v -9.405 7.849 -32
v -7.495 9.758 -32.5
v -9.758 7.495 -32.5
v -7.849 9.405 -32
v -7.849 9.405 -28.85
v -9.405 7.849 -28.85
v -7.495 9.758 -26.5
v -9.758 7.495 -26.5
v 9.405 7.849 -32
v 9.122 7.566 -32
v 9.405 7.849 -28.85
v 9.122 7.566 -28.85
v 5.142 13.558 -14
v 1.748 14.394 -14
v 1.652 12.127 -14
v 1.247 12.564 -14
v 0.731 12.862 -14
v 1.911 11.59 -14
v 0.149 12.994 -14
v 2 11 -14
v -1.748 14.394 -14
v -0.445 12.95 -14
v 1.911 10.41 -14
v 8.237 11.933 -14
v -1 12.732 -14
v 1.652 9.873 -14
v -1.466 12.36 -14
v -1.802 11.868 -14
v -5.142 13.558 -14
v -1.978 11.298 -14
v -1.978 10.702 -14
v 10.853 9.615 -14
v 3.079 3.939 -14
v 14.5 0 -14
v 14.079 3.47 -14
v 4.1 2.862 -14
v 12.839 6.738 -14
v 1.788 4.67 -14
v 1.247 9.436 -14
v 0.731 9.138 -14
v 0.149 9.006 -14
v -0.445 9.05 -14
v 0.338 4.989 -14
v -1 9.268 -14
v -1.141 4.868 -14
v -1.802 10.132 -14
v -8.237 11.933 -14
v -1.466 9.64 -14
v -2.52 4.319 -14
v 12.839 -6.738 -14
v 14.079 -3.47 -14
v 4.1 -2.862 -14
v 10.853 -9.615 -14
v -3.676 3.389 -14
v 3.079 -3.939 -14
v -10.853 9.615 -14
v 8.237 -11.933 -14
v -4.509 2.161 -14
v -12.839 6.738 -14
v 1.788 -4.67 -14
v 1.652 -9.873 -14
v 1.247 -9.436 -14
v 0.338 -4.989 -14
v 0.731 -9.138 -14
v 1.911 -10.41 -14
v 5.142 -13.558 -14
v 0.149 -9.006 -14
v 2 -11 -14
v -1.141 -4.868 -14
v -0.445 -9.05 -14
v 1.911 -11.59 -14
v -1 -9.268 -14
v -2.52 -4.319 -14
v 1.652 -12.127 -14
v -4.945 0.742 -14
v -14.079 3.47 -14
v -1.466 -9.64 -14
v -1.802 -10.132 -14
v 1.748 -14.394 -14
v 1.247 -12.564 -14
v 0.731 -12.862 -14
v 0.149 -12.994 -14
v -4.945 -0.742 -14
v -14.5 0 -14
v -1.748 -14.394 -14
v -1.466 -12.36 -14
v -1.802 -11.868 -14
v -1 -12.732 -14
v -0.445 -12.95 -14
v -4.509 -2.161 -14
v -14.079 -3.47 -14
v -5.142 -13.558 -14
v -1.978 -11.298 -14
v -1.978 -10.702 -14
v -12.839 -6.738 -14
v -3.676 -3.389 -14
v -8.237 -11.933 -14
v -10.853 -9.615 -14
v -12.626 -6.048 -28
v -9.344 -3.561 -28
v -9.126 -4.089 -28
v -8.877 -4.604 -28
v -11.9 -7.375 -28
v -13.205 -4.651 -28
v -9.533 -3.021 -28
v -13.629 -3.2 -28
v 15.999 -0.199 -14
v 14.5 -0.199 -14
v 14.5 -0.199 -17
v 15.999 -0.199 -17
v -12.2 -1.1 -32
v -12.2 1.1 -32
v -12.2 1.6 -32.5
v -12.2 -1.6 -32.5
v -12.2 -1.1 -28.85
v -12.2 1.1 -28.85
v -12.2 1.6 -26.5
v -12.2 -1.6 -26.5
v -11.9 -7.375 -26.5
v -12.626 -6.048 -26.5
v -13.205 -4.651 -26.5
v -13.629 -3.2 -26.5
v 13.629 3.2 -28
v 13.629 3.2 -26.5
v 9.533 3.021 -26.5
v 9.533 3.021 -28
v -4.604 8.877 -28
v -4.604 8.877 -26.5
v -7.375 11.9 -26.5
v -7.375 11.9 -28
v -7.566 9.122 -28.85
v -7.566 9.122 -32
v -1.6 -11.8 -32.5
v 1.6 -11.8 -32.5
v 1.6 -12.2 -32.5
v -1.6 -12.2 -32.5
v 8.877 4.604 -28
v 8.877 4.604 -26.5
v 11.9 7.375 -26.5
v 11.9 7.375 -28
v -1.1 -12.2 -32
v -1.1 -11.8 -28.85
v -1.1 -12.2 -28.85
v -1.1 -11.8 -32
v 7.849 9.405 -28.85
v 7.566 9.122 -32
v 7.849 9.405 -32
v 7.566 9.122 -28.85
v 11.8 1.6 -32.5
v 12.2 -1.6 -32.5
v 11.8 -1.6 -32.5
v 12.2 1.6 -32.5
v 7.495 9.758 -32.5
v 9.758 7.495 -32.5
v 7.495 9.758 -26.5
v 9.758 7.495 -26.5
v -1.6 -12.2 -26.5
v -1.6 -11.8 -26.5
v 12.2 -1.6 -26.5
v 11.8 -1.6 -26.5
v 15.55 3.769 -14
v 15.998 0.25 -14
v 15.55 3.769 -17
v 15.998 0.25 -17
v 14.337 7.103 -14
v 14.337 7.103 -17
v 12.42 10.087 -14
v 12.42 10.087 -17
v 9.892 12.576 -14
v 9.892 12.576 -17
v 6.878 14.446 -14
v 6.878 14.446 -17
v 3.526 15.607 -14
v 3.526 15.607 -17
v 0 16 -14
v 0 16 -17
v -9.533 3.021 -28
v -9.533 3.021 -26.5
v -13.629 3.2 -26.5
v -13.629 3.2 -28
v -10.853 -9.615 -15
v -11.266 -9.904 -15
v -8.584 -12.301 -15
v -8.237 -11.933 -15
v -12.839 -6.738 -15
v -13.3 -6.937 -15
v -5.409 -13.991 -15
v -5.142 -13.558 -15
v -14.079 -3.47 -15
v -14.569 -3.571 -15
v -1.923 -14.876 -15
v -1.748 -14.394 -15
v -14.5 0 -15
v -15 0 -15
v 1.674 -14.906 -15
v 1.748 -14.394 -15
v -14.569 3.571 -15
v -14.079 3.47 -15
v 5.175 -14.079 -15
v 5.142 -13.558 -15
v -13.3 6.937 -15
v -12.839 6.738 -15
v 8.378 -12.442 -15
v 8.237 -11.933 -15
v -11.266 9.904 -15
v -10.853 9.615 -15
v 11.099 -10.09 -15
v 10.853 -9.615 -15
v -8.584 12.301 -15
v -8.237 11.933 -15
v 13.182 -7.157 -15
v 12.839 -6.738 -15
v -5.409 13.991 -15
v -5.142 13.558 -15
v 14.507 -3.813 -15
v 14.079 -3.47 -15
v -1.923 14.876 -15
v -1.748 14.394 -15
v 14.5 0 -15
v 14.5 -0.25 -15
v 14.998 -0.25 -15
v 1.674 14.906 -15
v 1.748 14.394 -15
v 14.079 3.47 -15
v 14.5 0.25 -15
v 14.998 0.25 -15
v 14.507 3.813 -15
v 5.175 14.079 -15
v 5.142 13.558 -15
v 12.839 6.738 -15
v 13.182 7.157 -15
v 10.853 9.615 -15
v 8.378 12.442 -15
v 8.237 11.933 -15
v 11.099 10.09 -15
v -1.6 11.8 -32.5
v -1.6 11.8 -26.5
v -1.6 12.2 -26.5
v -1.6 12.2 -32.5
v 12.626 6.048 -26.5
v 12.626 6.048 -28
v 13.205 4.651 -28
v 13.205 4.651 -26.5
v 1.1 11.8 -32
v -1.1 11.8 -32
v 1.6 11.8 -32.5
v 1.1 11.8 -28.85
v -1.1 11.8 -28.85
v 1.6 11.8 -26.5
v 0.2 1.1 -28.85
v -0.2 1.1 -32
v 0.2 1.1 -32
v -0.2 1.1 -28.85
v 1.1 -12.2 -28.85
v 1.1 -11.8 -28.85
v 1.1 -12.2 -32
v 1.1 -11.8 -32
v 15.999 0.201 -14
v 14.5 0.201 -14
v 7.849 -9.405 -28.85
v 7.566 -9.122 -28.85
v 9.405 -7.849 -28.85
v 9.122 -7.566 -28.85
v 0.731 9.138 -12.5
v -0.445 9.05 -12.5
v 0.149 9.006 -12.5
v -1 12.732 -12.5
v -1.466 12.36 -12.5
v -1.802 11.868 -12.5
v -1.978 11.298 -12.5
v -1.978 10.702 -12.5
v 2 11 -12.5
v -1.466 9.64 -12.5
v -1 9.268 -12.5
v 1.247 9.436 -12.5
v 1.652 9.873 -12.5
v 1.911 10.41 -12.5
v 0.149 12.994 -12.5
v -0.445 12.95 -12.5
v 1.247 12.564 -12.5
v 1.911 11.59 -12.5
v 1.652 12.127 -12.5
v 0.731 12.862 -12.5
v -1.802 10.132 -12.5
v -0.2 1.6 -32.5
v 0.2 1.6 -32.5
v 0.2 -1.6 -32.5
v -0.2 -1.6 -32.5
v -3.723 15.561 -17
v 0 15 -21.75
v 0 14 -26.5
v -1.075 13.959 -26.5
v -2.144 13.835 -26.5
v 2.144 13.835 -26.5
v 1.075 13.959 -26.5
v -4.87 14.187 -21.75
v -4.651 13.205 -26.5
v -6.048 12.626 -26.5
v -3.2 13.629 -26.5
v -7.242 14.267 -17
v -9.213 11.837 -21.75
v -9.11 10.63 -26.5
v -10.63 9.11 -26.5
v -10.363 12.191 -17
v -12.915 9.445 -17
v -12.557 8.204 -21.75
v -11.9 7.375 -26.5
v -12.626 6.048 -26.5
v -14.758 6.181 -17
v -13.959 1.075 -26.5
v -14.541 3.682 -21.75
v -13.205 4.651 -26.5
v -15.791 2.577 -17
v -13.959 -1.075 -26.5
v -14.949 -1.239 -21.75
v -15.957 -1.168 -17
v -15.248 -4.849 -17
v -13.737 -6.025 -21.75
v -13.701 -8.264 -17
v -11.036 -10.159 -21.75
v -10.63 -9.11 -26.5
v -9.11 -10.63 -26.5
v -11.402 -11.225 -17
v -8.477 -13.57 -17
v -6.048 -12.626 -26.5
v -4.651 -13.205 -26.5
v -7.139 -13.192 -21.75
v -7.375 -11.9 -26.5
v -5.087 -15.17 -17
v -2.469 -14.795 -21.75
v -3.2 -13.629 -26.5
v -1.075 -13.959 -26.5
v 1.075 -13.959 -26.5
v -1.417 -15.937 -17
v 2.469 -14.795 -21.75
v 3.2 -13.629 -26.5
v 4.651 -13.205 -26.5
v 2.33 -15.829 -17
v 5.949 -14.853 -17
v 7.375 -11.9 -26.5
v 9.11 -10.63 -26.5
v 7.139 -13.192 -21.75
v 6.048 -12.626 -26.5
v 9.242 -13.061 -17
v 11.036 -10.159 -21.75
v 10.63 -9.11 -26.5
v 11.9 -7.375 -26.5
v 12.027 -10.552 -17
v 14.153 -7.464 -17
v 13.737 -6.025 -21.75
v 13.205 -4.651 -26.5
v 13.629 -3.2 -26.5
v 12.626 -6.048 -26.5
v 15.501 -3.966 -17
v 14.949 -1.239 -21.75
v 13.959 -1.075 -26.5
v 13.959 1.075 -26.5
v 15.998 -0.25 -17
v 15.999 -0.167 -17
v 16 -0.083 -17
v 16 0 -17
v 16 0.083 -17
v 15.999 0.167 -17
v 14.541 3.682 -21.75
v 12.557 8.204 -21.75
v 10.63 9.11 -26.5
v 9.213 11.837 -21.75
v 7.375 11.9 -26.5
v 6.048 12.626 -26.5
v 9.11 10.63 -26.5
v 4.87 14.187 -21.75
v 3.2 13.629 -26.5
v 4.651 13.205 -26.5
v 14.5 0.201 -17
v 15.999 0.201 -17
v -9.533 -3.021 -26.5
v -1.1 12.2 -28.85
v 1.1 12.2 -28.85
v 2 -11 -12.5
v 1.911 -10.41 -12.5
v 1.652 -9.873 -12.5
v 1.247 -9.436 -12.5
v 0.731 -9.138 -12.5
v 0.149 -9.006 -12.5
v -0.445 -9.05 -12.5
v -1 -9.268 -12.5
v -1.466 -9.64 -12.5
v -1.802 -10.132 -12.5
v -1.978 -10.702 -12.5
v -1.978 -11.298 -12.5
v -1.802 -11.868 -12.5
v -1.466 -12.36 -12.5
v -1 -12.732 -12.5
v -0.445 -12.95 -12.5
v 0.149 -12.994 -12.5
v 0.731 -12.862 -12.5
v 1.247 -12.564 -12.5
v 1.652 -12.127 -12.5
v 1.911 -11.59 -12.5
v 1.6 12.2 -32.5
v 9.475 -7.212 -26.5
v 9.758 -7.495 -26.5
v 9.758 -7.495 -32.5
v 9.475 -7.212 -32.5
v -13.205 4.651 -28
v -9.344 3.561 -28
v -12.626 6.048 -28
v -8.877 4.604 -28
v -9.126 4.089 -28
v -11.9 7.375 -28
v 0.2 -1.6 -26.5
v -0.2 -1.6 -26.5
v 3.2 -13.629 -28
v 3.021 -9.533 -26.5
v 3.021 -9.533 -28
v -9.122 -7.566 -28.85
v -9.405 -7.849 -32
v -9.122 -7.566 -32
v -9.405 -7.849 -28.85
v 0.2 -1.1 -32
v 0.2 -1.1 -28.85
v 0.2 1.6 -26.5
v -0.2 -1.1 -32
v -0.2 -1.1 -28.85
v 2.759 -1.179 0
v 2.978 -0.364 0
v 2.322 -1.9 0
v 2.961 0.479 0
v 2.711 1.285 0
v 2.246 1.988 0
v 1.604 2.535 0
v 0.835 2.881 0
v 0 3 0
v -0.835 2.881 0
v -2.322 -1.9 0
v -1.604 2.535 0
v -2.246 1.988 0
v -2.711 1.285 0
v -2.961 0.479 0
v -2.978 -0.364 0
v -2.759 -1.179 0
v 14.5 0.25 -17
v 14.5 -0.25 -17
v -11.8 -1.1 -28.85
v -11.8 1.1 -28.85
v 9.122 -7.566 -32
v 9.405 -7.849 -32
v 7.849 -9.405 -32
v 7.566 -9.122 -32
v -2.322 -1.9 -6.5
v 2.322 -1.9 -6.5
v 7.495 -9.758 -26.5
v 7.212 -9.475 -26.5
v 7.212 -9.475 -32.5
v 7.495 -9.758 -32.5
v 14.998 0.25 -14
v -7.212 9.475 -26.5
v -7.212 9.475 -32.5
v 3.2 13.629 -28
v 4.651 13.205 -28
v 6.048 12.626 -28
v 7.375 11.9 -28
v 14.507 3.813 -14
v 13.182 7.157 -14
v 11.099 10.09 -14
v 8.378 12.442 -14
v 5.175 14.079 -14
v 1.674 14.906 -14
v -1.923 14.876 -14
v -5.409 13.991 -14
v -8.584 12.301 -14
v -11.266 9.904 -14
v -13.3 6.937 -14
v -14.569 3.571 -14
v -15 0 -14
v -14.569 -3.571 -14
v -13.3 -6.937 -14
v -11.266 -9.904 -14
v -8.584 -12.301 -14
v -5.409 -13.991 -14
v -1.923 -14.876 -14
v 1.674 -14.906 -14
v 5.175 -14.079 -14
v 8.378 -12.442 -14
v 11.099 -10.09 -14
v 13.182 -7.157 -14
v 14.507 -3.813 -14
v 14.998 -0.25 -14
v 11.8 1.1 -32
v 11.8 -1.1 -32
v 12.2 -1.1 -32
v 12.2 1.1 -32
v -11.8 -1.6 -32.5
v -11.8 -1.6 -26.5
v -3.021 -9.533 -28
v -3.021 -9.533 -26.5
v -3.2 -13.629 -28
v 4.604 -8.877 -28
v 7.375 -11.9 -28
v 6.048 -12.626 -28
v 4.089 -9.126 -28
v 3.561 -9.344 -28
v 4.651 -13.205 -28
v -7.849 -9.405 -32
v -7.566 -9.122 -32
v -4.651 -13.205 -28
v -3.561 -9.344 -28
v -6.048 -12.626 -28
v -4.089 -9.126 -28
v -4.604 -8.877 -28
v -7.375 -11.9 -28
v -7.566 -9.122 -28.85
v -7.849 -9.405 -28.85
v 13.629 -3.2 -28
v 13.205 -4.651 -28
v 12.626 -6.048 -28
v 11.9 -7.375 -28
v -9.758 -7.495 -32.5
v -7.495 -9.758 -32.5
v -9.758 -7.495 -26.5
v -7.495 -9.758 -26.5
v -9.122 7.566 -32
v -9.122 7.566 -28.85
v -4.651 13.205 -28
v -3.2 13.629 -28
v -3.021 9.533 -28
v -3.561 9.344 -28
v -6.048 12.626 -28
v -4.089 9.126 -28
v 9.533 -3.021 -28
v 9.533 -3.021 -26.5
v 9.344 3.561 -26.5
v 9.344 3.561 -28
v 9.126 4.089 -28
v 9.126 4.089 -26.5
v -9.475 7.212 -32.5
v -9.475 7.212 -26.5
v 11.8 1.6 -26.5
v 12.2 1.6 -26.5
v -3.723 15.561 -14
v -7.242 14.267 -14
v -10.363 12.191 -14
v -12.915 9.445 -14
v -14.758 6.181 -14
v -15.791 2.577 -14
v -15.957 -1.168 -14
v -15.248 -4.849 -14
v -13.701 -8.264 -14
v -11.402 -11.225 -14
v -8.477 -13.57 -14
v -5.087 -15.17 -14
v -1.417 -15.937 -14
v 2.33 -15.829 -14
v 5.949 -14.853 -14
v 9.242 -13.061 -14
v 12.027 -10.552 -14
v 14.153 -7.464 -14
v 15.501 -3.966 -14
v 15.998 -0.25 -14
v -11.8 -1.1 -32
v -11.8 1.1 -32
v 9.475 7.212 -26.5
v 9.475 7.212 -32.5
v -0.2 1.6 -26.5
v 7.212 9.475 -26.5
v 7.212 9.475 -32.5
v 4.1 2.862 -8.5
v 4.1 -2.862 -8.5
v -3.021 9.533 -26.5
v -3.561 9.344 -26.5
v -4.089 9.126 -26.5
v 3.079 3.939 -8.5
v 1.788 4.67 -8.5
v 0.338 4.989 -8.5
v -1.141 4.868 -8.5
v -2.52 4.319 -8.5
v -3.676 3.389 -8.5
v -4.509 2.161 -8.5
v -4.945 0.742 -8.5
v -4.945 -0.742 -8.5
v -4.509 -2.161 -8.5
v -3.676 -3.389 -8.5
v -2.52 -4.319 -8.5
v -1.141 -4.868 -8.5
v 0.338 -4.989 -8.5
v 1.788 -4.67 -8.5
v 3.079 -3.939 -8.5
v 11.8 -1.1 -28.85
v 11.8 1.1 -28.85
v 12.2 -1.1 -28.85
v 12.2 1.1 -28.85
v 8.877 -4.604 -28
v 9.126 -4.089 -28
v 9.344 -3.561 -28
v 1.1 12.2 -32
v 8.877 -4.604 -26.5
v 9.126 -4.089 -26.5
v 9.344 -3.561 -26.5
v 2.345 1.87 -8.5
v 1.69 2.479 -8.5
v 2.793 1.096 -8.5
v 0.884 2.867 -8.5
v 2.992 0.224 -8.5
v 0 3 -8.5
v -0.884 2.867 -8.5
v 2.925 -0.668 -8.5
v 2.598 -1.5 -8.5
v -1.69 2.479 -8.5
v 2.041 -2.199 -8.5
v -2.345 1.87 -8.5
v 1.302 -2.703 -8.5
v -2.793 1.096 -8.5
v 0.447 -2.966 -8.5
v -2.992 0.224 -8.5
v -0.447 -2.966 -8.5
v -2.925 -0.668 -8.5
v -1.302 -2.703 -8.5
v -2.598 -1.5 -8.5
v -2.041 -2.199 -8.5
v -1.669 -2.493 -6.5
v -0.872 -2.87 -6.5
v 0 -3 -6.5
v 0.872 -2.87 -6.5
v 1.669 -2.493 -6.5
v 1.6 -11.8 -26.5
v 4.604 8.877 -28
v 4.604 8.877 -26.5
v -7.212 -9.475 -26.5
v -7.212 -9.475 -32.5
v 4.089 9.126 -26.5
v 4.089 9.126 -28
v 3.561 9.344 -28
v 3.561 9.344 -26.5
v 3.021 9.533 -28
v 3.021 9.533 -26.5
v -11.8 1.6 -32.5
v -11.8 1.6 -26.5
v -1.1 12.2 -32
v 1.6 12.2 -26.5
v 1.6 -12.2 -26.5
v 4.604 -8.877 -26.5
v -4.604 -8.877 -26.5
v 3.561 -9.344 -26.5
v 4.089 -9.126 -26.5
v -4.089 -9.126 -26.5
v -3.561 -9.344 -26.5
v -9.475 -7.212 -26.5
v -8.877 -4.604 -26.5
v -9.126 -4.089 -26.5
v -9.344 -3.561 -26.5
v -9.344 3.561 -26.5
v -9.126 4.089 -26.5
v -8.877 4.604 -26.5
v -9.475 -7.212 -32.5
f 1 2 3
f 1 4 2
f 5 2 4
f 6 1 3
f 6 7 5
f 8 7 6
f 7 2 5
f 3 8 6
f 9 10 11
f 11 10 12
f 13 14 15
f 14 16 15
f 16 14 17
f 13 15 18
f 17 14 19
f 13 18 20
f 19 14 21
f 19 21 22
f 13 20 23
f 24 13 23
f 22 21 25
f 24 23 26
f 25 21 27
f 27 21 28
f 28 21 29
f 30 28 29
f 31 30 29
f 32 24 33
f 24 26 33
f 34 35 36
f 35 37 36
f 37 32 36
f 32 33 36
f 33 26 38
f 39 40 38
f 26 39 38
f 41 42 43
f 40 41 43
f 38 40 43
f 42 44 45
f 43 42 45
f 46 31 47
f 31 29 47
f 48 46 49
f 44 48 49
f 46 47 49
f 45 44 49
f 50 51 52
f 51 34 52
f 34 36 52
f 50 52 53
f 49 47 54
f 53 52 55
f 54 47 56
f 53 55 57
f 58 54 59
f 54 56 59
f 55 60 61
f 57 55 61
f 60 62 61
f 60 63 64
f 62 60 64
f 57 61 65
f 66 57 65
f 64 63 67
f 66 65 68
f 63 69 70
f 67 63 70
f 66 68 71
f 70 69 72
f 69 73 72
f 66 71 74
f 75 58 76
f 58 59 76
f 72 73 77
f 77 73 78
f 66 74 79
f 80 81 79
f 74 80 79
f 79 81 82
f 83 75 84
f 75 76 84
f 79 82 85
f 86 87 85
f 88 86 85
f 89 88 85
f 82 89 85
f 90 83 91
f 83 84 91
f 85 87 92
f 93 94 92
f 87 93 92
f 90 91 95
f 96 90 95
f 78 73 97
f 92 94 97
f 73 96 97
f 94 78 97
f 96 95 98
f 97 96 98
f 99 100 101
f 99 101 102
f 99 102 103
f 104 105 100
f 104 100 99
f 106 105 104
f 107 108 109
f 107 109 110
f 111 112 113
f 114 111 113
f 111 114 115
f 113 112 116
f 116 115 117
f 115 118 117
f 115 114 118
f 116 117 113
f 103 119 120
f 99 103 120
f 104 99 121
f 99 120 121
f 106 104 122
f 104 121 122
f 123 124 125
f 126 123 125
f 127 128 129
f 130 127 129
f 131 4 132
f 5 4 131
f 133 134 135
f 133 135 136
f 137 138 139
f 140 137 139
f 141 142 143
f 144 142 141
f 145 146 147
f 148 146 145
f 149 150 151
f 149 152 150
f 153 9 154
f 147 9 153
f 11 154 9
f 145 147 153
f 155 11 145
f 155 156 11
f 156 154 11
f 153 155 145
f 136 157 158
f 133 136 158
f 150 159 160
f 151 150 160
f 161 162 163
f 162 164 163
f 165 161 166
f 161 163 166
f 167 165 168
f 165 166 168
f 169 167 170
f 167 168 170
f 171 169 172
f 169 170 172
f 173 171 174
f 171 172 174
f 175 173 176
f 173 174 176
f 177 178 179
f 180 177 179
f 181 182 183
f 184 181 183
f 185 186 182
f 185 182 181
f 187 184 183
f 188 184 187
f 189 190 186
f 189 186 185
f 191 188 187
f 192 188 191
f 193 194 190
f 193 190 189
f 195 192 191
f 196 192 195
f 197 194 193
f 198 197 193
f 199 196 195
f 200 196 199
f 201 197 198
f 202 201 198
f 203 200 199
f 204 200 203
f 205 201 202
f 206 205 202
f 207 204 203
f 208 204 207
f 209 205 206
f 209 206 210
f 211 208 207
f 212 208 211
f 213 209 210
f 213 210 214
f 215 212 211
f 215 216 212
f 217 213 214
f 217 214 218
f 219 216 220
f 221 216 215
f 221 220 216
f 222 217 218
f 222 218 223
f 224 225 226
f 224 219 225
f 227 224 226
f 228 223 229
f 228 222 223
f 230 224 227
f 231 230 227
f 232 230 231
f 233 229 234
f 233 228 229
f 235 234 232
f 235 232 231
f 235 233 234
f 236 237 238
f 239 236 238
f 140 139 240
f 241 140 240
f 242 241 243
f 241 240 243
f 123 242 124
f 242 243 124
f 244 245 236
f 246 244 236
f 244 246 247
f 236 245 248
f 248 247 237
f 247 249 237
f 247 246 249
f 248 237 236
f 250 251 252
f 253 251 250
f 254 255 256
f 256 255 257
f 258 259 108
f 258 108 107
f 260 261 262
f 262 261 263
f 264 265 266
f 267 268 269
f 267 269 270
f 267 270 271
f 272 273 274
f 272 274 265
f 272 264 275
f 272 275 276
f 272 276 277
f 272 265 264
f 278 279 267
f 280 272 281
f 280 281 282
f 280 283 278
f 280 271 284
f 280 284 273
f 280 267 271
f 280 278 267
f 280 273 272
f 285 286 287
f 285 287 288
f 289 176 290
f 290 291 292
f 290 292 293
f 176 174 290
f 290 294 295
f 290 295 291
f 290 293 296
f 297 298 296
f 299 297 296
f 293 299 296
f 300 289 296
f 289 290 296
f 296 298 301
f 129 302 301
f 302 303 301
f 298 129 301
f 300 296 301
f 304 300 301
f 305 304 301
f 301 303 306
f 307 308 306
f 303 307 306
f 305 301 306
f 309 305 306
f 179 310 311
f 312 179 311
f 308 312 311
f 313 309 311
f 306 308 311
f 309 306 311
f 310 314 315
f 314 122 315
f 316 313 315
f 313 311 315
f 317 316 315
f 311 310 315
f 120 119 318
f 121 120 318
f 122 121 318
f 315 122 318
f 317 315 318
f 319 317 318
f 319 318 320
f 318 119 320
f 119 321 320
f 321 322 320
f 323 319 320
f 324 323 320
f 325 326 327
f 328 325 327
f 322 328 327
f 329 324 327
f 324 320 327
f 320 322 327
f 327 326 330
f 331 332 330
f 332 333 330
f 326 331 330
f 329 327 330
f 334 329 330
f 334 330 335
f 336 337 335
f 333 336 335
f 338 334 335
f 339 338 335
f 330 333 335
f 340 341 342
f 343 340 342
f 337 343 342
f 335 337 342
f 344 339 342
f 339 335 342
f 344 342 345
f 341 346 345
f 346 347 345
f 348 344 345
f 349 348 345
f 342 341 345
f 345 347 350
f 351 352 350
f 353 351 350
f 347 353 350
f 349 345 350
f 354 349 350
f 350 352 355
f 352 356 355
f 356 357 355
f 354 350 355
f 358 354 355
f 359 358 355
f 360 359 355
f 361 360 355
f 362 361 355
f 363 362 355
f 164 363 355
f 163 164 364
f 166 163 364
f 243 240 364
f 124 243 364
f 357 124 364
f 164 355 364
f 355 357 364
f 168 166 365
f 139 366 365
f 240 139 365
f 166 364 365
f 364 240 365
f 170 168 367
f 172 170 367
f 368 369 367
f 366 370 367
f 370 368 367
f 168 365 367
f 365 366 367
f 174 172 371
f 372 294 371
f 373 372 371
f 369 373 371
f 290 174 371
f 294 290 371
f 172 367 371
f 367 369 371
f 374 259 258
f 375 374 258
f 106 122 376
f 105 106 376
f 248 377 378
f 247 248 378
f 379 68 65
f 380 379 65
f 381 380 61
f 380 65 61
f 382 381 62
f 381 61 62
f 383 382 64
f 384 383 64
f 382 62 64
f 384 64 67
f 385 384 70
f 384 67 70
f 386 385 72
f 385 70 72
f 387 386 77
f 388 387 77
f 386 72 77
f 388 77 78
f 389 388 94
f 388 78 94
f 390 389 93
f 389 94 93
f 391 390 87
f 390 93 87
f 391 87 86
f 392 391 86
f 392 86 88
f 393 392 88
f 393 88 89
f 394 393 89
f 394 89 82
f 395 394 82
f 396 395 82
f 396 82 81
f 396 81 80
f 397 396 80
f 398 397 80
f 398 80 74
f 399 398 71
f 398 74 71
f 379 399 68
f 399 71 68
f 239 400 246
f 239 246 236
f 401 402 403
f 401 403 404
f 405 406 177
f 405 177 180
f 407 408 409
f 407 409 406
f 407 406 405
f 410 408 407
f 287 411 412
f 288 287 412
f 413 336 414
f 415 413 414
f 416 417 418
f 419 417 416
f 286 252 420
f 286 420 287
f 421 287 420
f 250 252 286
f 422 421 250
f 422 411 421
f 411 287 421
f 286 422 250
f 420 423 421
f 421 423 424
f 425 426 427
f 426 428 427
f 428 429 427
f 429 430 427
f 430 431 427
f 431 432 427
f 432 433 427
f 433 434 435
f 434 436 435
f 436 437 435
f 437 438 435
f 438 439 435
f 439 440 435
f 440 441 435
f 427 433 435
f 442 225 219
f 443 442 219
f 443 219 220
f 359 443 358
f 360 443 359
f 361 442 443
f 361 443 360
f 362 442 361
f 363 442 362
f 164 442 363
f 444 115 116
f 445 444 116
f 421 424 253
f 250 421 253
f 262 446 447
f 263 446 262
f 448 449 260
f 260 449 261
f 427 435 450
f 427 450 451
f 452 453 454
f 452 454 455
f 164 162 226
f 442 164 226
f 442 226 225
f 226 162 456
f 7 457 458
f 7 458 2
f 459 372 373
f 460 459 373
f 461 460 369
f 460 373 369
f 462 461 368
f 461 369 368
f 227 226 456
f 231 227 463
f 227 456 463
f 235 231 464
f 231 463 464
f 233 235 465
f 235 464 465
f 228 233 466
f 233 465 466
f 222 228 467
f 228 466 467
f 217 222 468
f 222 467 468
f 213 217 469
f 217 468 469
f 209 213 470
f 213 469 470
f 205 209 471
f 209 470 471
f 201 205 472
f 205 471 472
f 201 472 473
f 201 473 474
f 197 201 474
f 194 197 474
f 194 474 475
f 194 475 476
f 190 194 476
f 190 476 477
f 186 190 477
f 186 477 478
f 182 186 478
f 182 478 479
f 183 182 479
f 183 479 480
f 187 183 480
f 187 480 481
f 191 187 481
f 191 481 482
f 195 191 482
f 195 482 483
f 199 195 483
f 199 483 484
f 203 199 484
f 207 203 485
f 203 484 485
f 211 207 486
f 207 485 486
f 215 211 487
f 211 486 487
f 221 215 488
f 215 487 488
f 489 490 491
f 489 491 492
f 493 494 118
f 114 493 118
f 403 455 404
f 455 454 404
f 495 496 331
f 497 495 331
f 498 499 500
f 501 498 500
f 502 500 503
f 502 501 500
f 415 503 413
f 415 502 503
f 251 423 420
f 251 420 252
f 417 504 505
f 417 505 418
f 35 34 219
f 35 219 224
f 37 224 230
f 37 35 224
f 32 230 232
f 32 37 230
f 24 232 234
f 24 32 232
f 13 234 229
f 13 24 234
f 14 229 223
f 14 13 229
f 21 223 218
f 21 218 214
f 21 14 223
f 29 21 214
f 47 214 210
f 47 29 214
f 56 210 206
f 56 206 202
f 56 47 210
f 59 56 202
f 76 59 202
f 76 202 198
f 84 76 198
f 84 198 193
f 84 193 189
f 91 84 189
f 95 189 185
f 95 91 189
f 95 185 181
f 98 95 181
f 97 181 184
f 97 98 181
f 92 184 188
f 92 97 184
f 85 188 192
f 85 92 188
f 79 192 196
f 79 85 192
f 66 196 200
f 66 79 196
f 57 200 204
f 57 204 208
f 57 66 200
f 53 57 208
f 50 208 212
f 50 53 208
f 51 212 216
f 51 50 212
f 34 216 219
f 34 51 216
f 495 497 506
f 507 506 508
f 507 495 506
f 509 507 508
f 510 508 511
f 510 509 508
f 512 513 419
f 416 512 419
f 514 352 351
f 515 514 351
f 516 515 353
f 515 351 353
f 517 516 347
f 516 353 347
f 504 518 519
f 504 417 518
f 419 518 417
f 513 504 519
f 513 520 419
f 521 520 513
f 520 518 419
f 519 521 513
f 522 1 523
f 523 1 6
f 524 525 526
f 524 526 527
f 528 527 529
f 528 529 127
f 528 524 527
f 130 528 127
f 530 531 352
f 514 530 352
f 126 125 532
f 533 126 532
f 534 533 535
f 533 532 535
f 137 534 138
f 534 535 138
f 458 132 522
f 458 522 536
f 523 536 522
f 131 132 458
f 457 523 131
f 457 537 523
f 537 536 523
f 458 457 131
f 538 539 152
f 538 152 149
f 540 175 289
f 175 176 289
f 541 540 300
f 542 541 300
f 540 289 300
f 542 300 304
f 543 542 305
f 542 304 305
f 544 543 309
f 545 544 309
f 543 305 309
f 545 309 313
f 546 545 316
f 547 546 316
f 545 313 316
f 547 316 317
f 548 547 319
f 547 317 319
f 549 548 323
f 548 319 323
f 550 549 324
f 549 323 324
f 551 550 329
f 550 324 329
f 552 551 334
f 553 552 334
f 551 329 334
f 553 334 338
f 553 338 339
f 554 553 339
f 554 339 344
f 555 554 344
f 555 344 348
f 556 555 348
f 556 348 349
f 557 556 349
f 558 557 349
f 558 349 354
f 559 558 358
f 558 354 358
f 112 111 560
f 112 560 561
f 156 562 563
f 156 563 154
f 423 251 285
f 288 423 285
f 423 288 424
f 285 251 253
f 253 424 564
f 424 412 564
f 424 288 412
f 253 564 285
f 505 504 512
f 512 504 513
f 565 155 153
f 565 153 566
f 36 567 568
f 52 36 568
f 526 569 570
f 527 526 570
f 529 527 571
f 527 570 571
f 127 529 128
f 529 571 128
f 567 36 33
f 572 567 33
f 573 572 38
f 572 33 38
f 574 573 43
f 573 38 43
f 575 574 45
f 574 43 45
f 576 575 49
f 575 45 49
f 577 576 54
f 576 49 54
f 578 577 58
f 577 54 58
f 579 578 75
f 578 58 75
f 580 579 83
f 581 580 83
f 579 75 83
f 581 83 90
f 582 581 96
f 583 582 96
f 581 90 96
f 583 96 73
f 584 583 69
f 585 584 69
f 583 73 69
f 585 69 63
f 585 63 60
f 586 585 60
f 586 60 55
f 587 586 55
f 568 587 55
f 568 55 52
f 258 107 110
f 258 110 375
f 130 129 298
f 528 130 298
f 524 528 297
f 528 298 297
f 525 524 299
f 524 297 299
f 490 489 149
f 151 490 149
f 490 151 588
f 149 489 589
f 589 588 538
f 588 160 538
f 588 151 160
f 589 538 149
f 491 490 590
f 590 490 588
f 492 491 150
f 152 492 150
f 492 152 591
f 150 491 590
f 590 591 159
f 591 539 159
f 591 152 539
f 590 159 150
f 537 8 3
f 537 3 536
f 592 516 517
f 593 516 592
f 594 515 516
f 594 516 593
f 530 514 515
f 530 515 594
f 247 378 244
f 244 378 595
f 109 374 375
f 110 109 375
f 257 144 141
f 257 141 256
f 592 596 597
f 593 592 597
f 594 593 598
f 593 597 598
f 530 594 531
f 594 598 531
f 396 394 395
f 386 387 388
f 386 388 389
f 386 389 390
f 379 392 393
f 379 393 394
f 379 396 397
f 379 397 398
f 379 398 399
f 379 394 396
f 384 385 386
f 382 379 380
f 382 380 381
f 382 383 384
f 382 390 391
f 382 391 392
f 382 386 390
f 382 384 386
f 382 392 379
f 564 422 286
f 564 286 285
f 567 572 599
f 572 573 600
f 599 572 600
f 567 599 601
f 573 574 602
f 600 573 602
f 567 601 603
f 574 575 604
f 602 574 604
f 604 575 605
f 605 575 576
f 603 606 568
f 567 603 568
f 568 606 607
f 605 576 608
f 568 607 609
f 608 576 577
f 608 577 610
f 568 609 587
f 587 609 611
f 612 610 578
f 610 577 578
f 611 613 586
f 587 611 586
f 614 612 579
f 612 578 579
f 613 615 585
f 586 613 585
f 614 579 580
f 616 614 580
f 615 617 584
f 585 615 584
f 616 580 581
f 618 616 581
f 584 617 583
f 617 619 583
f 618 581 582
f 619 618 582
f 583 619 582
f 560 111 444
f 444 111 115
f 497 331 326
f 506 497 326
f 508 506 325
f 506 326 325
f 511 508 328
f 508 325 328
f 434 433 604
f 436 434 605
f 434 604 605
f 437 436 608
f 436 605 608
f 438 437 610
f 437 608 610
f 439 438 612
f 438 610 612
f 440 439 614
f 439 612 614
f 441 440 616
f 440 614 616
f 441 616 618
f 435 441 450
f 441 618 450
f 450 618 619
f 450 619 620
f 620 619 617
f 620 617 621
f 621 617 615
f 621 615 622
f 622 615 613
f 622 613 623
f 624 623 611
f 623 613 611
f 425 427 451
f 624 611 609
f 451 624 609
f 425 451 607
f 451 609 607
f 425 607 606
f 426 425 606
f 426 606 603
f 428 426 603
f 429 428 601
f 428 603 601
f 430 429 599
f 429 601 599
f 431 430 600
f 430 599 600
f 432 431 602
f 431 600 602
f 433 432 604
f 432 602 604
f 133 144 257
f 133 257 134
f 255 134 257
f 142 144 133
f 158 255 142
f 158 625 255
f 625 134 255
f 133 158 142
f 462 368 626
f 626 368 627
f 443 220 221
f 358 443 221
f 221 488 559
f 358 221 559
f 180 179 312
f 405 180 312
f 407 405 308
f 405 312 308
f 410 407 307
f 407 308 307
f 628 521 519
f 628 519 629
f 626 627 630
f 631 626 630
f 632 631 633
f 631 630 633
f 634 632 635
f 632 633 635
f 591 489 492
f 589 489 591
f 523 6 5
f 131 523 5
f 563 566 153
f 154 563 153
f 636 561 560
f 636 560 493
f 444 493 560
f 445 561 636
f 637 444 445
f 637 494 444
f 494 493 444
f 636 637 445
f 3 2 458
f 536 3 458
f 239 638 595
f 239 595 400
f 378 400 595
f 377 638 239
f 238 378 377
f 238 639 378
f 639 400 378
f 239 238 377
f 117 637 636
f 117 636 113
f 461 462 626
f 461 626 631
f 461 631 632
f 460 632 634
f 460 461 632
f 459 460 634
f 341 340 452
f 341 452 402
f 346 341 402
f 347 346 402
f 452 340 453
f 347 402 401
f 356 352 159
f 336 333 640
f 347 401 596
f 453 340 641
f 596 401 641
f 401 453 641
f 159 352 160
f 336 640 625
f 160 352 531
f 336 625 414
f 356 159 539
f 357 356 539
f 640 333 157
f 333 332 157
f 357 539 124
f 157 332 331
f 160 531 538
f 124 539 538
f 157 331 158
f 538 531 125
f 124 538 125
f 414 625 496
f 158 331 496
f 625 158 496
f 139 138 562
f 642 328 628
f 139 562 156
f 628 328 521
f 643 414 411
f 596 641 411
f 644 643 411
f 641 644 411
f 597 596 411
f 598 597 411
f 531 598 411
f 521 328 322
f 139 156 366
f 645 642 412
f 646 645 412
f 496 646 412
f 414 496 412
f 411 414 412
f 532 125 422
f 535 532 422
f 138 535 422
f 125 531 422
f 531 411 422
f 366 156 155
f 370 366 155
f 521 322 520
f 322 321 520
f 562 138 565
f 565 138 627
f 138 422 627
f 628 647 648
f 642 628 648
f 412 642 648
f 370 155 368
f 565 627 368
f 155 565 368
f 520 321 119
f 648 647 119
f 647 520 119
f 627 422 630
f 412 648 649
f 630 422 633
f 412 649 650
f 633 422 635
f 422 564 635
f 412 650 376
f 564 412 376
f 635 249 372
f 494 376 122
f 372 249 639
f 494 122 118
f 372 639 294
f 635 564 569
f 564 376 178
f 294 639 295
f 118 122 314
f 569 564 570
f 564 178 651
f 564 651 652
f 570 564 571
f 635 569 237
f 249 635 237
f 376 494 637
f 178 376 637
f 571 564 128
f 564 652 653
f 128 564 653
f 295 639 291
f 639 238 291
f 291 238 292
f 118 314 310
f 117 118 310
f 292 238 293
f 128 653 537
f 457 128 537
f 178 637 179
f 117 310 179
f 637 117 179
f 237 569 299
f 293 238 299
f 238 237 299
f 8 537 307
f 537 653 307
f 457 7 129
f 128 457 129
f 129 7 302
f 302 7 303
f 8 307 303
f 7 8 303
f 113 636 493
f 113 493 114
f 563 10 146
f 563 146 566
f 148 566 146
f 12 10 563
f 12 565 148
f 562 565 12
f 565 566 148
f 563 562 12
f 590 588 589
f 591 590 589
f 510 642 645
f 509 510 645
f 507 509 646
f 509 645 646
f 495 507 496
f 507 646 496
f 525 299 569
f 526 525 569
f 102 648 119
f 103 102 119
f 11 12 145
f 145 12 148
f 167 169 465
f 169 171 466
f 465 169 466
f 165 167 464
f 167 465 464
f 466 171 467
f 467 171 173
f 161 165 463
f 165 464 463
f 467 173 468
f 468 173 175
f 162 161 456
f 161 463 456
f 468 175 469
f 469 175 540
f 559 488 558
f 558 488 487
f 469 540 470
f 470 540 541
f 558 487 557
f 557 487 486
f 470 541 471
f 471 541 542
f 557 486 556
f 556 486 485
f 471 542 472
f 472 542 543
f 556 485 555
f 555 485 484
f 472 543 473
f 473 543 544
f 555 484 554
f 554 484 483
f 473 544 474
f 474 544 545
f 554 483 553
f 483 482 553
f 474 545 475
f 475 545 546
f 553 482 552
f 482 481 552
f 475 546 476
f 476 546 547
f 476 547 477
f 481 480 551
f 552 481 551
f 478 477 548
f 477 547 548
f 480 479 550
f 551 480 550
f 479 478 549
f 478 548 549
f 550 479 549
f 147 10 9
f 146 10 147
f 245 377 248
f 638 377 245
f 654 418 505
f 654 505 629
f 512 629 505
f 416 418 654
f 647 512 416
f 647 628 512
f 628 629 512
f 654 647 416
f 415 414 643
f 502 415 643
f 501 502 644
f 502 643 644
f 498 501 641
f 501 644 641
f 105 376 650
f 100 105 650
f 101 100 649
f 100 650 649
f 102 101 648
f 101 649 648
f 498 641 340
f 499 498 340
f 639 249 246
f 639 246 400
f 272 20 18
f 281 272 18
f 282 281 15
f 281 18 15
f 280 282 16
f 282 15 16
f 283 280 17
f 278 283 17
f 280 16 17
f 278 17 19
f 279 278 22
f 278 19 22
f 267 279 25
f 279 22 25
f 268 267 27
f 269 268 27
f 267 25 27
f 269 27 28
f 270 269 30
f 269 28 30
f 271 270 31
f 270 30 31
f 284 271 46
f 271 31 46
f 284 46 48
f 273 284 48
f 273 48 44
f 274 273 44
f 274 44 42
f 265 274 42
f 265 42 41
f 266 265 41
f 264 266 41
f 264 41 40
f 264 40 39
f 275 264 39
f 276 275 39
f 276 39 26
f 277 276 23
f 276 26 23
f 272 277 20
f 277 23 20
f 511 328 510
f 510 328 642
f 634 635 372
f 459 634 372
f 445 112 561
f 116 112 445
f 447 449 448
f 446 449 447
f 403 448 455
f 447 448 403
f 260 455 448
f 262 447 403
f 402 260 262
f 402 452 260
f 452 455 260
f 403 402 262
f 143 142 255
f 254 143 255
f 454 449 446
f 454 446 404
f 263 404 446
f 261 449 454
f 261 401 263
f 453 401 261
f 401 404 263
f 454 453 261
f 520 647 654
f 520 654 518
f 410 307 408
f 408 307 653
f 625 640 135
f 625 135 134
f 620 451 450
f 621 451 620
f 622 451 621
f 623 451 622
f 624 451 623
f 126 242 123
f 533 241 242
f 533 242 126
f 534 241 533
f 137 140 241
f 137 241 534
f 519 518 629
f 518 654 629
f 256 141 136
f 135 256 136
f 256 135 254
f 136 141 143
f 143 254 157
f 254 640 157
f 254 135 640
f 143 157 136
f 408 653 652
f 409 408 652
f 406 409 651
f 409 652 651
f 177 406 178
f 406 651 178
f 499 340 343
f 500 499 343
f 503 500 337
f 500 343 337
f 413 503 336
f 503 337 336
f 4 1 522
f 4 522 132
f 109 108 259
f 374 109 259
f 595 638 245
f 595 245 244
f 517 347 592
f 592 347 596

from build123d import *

# Parameters (mm, degrees)
CORTAR_EXTRUIR1_DEPTH   = 6.5
CORTAR_EXTRUIR2_DEPTH   = 5.5
CROQUIS6_R              = 2
SALIENTE_EXTRUIR1_DEPTH = 1.5
CROQUIS10_R             = 15
CROQUIS10_R_2           = 14.5
CORTAR_EXTRUIR5_DEPTH   = 1
CORTAR_EXTRUIR6_DEPTH   = 3
CROQUIS12_W             = 1.498741956
CROQUIS12_H             = 0.4
SALIENTE_EXTRUIR5_DEPTH = 3
SALIENTE_EXTRUIR6_DEPTH = 1.5
CROQUIS13_3_W           = 3.2
CROQUIS13_3_H           = 0.4
CROQUIS13_3_W_2         = 0.4
CROQUIS13_3_H_2         = 1.6
CROQUIS13_3_H_3         = 3.2
SALIENTE_EXTRUIR7_DEPTH = 6
CROQUIS14_W             = 2.2
CROQUIS14_H             = 3.15
CORTAR_EXTRUIR8_DEPTH   = 29.2
CROQUIS16_W             = 3.15
CROQUIS16_H             = 2.2
CORTAR_EXTRUIR10_DEPTH  = 35.827416998
CROQUIS17_W             = 3.15
CROQUIS17_H             = 2.2
CORTAR_EXTRUIR11_DEPTH  = 35.827416998
CROQUIS18_W             = 0.4
CROQUIS18_H             = 3.2
SALIENTE_EXTRUIR8_DEPTH = 6
CROQUIS15_W             = 3.15
CROQUIS15_H             = 2.2
CORTAR_EXTRUIR12_DEPTH  = 29.2


with BuildPart() as part:
    # Croquis3 → Revolución1 (revolve)
    with BuildSketch(Plane(origin=(0, 0, 0), x_dir=(0, 0, -1), z_dir=(1, 0, 0))):
        Polygon((0, 0), (0, 3), (8.5, 3), (8.5, 5), (14, 5), (14, 16), (17, 16), (26.5, 14), (26.5, 0), align=None)
    revolve(axis=Axis((0, 0, -26.5), (0, 0, 1)))

    # Croquis4 → Cortar-Extruir1 (cut)
    with BuildSketch(Plane.XY):
        with BuildLine():
            Line((-2.321637353, -1.9), (2.321637353, -1.9))
            ThreePointArc((2.321637353, -1.9), (0, -3), (-2.321637353, -1.9))
        make_face()
    extrude(amount=-CORTAR_EXTRUIR1_DEPTH, mode=Mode.SUBTRACT)

    # Croquis5 → Cortar-Extruir2 (cut)
    with BuildSketch(Plane.XY.offset(-8.5)):
        with BuildLine():
            Line((4.1, 2.861817604), (4.1, -2.861817604))
            ThreePointArc((4.1, -2.861817604), (5, 0), (4.1, 2.861817604))
        make_face()
    extrude(amount=-CORTAR_EXTRUIR2_DEPTH, mode=Mode.SUBTRACT)

    # Croquis6 → Saliente-Extruir1 (add)
    with BuildSketch(Plane.XY.offset(-14)):
        with Locations((0, 11)):
            Circle(CROQUIS6_R)
        with Locations((0, -11)):
            Circle(CROQUIS6_R)
    extrude(amount=SALIENTE_EXTRUIR1_DEPTH)

    # Croquis10 → Cortar-Extruir5 (cut)
    with BuildSketch(Plane.XY.offset(-14)):
        Circle(CROQUIS10_R)
        Circle(CROQUIS10_R_2, mode=Mode.SUBTRACT)
    extrude(amount=-CORTAR_EXTRUIR5_DEPTH, mode=Mode.SUBTRACT)

    # Croquis11 → Cortar-Extruir6 (cut)
    with BuildSketch(Plane.XY.offset(-14)):
        with BuildLine():
            Line((14.5, 0), (14.5, -0.25))
            Line((14.5, -0.25), (15.998046756, -0.25))
            ThreePointArc((15.998046756, -0.25), (15.999511681, -0.125003815), (16, 0))
            ThreePointArc((16, 0), (15.999511681, 0.125003815), (15.998046756, 0.25))
            Line((15.998046756, 0.25), (14.5, 0.25))
            Line((14.5, 0.25), (14.5, 0))
        make_face()
    extrude(amount=-CORTAR_EXTRUIR6_DEPTH, mode=Mode.SUBTRACT)

    # Croquis13 → Saliente-Extruir6 (add)
    with BuildSketch(Plane(origin=(0, 0, -26.5), x_dir=(-1, 0, 0), z_dir=(0, 0, -1))):
        with BuildLine():
            ThreePointArc((7.374685343, 11.900168742), (5.357568053, 12.934313455), (3.2, 13.62938003))
            Line((3.2, 13.62938003), (3.021135931, 9.532719323))
            ThreePointArc((3.021135931, 9.532719323), (3.826834324, 9.238795325), (4.604384773, 8.87691618))
            Line((4.604384773, 8.87691618), (7.374685343, 11.900168742))
        make_face()
        with BuildLine():
            ThreePointArc((13.62938003, 3.2), (12.934313455, 5.357568053), (11.900168742, 7.374685343))
            Line((11.900168742, 7.374685343), (8.87691618, 4.604384773))
            ThreePointArc((8.87691618, 4.604384773), (9.238795325, 3.826834324), (9.532719323, 3.021135931))
            Line((9.532719323, 3.021135931), (13.62938003, 3.2))
        make_face()
        with BuildLine():
            ThreePointArc((11.900168742, -7.374685343), (12.934313455, -5.357568053), (13.62938003, -3.2))
            Line((13.62938003, -3.2), (9.532719323, -3.021135931))
            ThreePointArc((9.532719323, -3.021135931), (9.238795325, -3.826834324), (8.87691618, -4.604384773))
            Line((8.87691618, -4.604384773), (11.900168742, -7.374685343))
        make_face()
        with BuildLine():
            ThreePointArc((3.2, -13.62938003), (5.357568053, -12.934313455), (7.374685343, -11.900168742))
            Line((7.374685343, -11.900168742), (4.604384773, -8.87691618))
            ThreePointArc((4.604384773, -8.87691618), (3.826834324, -9.238795325), (3.021135931, -9.532719323))
            Line((3.021135931, -9.532719323), (3.2, -13.62938003))
        make_face()
        with BuildLine():
            Line((-4.604384773, -8.87691618), (-7.374685343, -11.900168742))
            ThreePointArc((-7.374685343, -11.900168742), (-5.357568053, -12.934313455), (-3.2, -13.62938003))
            Line((-3.2, -13.62938003), (-3.021135931, -9.532719323))
            ThreePointArc((-3.021135931, -9.532719323), (-3.826834324, -9.238795325), (-4.604384773, -8.87691618))
        make_face()
        with BuildLine():
            Line((-9.532719323, -3.021135931), (-13.62938003, -3.2))
            ThreePointArc((-13.62938003, -3.2), (-12.934313455, -5.357568053), (-11.900168742, -7.374685343))
            Line((-11.900168742, -7.374685343), (-8.87691618, -4.604384773))
            ThreePointArc((-8.87691618, -4.604384773), (-9.238795325, -3.826834324), (-9.532719323, -3.021135931))
        make_face()
        with BuildLine():
            Line((-8.87691618, 4.604384773), (-11.900168742, 7.374685343))
            ThreePointArc((-11.900168742, 7.374685343), (-12.934313455, 5.357568053), (-13.62938003, 3.2))
            Line((-13.62938003, 3.2), (-9.532719323, 3.021135931))
            ThreePointArc((-9.532719323, 3.021135931), (-9.238795325, 3.826834324), (-8.87691618, 4.604384773))
        make_face()
        with BuildLine():
            Line((-3.021135931, 9.532719323), (-3.2, 13.62938003))
            ThreePointArc((-3.2, 13.62938003), (-5.357568053, 12.934313455), (-7.374685343, 11.900168742))
            Line((-7.374685343, 11.900168742), (-4.604384773, 8.87691618))
            ThreePointArc((-4.604384773, 8.87691618), (-3.826834324, 9.238795325), (-3.021135931, 9.532719323))
        make_face()
    extrude(amount=SALIENTE_EXTRUIR6_DEPTH)

    # Croquis13<3> → Saliente-Extruir7 (add)
    with BuildSketch(Plane(origin=(0, 0, -26.5), x_dir=(-1, 0, 0), z_dir=(0, 0, -1))):
        with Locations((0, 12)):
            Rectangle(CROQUIS13_3_W, CROQUIS13_3_H)
        Polygon((7.495331881, 9.75807358), (9.75807358, 7.495331881), (9.475230868, 7.212489168), (7.212489168, 9.475230868), align=None)
        Polygon((-9.75807358, 7.495331881), (-7.495331881, 9.75807358), (-7.212489168, 9.475230868), (-9.475230868, 7.212489168), align=None)
        with Locations((-12, -0.8)):
            Rectangle(CROQUIS13_3_W_2, CROQUIS13_3_H_2)
        with Locations((-12, 0.8)):
            Rectangle(CROQUIS13_3_W_2, CROQUIS13_3_H_2)
        Polygon((-7.495331881, -9.75807358), (-9.75807358, -7.495331881), (-9.475230868, -7.212489168), (-7.212489168, -9.475230868), align=None)
        with Locations((0, -12)):
            Rectangle(CROQUIS13_3_W, CROQUIS13_3_H)
        Polygon((9.75807358, -7.495331881), (7.495331881, -9.75807358), (7.212489168, -9.475230868), (9.475230868, -7.212489168), align=None)
        with Locations((12, 0)):
            Rectangle(CROQUIS13_3_W_2, CROQUIS13_3_H_3)
    extrude(amount=SALIENTE_EXTRUIR7_DEPTH)

    # Croquis14 → Cortar-Extruir8 (cut, through all)
    with BuildSketch(Plane(origin=(0, 12.2, 0), x_dir=(1, 0, 0), z_dir=(0, 1, 0))):
        with Locations((0, 30.425)):
            Rectangle(CROQUIS14_W, CROQUIS14_H)
    extrude(amount=-CORTAR_EXTRUIR8_DEPTH, mode=Mode.SUBTRACT)

    # Croquis16 → Cortar-Extruir10 (cut, through all)
    with BuildSketch(Plane(origin=(-8.62670273, 8.62670273, 0), x_dir=(0, 0, 1), z_dir=(-0.707106781, 0.707106781, 0))):
        with Locations((-30.425, 0)):
            Rectangle(CROQUIS16_W, CROQUIS16_H)
    extrude(amount=-CORTAR_EXTRUIR10_DEPTH, mode=Mode.SUBTRACT)

    # Croquis17 → Cortar-Extruir11 (cut, through all)
    with BuildSketch(Plane(origin=(-8.62670273, -8.62670273, 0), x_dir=(0, 0, 1), z_dir=(-0.707106781, -0.707106781, 0))):
        with Locations((-30.425, 0)):
            Rectangle(CROQUIS17_W, CROQUIS17_H)
    extrude(amount=-CORTAR_EXTRUIR11_DEPTH, mode=Mode.SUBTRACT)

    # Croquis18 → Saliente-Extruir8 (add)
    with BuildSketch(Plane(origin=(0, 0, -26.5), x_dir=(-1, 0, 0), z_dir=(0, 0, -1))):
        Rectangle(CROQUIS18_W, CROQUIS18_H)
    extrude(amount=SALIENTE_EXTRUIR8_DEPTH)

    # Croquis15 → Cortar-Extruir12 (cut, through all)
    with BuildSketch(Plane.ZY.offset(12.2)):
        with Locations((-30.425, 0)):
            Rectangle(CROQUIS15_W, CROQUIS15_H)
    extrude(amount=-CORTAR_EXTRUIR12_DEPTH, mode=Mode.SUBTRACT)


with BuildPart() as body_2:
    # Croquis12 → Saliente-Extruir5 (new body)
    with BuildSketch(Plane.XY.offset(-14)):
        with Locations((15.249370978, 0.00063854)):
            Rectangle(CROQUIS12_W, CROQUIS12_H)
    extrude(amount=-SALIENTE_EXTRUIR5_DEPTH)


solid = Compound([part.part, body_2.part])
